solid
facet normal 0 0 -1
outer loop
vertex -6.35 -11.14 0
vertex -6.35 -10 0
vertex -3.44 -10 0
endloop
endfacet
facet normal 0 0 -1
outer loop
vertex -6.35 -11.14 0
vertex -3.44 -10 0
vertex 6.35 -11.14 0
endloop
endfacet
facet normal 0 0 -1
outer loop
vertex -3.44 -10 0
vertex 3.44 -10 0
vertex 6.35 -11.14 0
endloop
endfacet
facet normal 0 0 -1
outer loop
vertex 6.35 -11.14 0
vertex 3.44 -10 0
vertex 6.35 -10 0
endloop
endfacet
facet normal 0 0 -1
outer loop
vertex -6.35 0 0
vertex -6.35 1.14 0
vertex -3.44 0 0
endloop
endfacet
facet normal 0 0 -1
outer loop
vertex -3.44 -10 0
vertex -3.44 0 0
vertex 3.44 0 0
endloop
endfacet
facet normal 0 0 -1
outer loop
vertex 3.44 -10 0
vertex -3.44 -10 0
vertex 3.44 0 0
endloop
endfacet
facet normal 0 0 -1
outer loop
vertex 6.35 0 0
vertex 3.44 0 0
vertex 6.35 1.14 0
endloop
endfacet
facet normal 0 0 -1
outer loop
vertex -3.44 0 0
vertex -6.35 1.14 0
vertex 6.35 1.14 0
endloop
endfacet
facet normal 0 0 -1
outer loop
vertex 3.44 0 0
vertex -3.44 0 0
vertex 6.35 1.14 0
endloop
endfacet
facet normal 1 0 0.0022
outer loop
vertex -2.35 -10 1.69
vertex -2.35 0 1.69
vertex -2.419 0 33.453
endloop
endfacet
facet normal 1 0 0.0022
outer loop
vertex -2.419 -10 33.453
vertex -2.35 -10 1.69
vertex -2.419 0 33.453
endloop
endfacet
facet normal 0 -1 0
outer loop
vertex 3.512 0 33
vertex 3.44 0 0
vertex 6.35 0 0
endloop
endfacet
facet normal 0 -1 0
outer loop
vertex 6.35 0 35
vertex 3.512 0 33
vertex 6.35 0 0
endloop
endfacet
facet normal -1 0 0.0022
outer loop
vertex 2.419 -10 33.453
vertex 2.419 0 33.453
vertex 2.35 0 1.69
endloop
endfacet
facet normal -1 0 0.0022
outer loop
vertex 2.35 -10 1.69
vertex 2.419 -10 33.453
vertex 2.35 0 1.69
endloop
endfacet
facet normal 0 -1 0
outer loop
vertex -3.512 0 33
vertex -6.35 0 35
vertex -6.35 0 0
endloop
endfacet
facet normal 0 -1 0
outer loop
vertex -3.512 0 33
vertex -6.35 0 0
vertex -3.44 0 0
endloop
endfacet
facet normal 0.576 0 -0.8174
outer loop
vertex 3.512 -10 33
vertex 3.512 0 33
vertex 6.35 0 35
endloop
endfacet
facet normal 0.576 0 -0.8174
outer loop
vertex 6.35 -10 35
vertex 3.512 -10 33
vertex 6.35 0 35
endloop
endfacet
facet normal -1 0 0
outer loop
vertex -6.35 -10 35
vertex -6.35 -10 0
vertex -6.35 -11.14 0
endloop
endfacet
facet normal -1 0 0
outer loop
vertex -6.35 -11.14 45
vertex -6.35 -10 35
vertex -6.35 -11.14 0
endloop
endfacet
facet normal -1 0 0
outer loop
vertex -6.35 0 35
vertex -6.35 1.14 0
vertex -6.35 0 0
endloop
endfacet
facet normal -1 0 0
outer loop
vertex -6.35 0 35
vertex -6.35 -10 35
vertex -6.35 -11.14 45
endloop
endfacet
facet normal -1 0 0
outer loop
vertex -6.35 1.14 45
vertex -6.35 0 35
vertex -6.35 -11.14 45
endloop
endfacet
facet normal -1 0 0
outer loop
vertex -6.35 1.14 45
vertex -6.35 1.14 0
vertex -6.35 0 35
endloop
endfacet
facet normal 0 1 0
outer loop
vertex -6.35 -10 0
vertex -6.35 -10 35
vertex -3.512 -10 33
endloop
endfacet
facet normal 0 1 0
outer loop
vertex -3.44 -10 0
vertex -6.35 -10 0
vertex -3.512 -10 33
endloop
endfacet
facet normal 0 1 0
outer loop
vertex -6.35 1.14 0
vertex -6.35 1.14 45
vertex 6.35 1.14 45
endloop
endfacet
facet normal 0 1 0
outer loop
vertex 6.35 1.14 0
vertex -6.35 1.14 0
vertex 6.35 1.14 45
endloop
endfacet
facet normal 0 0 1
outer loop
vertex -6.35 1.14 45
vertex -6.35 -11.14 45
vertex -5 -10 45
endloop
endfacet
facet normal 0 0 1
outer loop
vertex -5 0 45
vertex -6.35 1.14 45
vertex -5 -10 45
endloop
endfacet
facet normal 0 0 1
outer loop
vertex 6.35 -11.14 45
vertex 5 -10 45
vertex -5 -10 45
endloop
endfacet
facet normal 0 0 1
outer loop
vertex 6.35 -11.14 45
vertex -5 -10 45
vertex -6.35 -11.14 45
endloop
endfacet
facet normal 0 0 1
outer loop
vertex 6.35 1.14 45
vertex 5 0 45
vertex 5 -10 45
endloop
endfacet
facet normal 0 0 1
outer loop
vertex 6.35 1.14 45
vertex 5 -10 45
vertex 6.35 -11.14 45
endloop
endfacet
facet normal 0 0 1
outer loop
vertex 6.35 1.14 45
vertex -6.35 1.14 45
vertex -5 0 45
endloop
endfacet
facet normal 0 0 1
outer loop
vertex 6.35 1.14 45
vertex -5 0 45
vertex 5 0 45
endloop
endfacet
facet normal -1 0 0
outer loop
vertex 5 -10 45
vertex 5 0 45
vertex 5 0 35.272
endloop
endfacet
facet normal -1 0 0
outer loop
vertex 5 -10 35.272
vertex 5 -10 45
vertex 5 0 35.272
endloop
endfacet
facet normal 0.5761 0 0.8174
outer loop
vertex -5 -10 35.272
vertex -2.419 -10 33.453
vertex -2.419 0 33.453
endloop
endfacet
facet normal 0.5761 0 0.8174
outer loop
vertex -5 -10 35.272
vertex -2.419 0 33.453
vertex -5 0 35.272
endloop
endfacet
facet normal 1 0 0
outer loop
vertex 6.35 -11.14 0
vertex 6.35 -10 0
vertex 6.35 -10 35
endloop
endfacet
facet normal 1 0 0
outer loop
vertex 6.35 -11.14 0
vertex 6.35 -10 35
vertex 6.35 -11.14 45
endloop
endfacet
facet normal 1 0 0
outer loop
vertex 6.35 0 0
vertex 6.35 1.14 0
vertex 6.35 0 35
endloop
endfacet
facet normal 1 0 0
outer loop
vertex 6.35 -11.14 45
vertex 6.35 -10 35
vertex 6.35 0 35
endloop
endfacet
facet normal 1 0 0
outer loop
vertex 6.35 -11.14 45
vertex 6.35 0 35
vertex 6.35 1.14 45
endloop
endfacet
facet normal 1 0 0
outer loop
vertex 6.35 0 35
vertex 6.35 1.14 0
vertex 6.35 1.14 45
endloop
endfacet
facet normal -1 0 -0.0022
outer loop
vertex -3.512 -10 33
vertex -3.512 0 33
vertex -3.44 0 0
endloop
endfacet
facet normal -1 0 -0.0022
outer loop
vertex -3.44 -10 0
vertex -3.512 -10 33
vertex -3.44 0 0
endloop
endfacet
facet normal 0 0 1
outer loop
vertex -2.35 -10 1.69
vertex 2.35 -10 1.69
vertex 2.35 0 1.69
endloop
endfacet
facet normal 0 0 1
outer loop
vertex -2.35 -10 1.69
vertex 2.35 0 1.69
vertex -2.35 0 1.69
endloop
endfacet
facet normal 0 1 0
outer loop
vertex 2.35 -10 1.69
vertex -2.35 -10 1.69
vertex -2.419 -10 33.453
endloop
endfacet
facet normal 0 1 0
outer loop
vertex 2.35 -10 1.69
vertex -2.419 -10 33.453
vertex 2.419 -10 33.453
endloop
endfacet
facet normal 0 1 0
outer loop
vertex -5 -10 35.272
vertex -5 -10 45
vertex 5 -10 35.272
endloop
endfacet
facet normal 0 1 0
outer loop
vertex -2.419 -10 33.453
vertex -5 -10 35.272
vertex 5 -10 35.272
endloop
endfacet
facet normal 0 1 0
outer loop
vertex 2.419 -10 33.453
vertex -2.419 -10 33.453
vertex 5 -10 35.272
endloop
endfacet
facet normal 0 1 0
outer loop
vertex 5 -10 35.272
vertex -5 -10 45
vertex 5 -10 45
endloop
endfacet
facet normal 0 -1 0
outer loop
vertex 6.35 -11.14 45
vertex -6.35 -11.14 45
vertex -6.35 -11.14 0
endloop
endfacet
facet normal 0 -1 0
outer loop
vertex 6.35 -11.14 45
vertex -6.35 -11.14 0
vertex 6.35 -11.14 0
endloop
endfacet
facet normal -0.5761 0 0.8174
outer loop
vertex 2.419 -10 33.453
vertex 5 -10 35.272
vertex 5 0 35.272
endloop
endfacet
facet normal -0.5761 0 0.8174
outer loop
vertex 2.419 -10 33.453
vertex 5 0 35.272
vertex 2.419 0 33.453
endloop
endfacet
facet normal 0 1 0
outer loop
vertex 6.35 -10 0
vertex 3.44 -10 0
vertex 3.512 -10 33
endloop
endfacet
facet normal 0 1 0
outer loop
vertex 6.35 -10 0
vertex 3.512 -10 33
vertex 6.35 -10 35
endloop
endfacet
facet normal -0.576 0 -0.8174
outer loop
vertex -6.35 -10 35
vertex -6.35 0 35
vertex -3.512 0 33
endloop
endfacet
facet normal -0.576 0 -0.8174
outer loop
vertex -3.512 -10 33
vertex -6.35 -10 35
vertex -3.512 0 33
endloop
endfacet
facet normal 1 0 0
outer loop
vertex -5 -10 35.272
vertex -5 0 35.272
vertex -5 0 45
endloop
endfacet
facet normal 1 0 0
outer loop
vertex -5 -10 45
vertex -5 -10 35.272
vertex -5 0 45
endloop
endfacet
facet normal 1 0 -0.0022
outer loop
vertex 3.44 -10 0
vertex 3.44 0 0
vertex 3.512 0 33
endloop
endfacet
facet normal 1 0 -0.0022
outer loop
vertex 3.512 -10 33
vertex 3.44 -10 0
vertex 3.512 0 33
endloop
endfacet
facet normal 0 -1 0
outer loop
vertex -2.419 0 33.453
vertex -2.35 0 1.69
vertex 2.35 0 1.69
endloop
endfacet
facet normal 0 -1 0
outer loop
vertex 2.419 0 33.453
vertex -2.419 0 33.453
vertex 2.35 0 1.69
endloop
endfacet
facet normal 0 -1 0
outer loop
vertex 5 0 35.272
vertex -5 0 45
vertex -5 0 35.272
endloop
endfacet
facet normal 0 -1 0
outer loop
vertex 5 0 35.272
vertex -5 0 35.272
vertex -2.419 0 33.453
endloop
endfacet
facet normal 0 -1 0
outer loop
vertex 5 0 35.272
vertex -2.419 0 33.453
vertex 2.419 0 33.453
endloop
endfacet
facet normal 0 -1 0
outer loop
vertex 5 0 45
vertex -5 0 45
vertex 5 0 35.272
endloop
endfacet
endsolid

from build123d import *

# Parameters (mm, degrees)
F1_DEPTH = 10
F2_W     = 12.7
F2_H     = 45
F3_DEPTH = 1.14
F4_W     = 12.7
F4_H     = 45
F5_DEPTH = 1.14


with BuildPart() as f1:
    # F0 (on Front) → F1 (new body)
    with BuildSketch(Plane.XZ):
        Polygon((-5, 45), (-6.35, 45), (-6.35, 35), (-3.511587, 33), (-3.44, 0), (0, 0), (0, 1.69), (-2.35, 1.69), (-2.418905, 33.453385), (-5, 35.272074), align=None)
        Polygon((0, 1.69), (0, 0), (3.44, 0), (3.511587, 33), (6.35, 35), (6.35, 45), (5, 45), (5, 35.272074), (2.418905, 33.453385), (2.35, 1.69), align=None)
    extrude(amount=F1_DEPTH)

    # F2 (on Front) → F3 (join)
    with BuildSketch(Plane.XZ):
        with Locations((0, 22.5)):
            Rectangle(F2_W, F2_H)
    extrude(amount=-F3_DEPTH)

    # F4 (on face) → F5 (join)
    with BuildSketch(Plane.XZ.offset(10)):
        with Locations((0, 22.5)):
            Rectangle(F4_W, F4_H)
    extrude(amount=F5_DEPTH)


solid = f1.part
